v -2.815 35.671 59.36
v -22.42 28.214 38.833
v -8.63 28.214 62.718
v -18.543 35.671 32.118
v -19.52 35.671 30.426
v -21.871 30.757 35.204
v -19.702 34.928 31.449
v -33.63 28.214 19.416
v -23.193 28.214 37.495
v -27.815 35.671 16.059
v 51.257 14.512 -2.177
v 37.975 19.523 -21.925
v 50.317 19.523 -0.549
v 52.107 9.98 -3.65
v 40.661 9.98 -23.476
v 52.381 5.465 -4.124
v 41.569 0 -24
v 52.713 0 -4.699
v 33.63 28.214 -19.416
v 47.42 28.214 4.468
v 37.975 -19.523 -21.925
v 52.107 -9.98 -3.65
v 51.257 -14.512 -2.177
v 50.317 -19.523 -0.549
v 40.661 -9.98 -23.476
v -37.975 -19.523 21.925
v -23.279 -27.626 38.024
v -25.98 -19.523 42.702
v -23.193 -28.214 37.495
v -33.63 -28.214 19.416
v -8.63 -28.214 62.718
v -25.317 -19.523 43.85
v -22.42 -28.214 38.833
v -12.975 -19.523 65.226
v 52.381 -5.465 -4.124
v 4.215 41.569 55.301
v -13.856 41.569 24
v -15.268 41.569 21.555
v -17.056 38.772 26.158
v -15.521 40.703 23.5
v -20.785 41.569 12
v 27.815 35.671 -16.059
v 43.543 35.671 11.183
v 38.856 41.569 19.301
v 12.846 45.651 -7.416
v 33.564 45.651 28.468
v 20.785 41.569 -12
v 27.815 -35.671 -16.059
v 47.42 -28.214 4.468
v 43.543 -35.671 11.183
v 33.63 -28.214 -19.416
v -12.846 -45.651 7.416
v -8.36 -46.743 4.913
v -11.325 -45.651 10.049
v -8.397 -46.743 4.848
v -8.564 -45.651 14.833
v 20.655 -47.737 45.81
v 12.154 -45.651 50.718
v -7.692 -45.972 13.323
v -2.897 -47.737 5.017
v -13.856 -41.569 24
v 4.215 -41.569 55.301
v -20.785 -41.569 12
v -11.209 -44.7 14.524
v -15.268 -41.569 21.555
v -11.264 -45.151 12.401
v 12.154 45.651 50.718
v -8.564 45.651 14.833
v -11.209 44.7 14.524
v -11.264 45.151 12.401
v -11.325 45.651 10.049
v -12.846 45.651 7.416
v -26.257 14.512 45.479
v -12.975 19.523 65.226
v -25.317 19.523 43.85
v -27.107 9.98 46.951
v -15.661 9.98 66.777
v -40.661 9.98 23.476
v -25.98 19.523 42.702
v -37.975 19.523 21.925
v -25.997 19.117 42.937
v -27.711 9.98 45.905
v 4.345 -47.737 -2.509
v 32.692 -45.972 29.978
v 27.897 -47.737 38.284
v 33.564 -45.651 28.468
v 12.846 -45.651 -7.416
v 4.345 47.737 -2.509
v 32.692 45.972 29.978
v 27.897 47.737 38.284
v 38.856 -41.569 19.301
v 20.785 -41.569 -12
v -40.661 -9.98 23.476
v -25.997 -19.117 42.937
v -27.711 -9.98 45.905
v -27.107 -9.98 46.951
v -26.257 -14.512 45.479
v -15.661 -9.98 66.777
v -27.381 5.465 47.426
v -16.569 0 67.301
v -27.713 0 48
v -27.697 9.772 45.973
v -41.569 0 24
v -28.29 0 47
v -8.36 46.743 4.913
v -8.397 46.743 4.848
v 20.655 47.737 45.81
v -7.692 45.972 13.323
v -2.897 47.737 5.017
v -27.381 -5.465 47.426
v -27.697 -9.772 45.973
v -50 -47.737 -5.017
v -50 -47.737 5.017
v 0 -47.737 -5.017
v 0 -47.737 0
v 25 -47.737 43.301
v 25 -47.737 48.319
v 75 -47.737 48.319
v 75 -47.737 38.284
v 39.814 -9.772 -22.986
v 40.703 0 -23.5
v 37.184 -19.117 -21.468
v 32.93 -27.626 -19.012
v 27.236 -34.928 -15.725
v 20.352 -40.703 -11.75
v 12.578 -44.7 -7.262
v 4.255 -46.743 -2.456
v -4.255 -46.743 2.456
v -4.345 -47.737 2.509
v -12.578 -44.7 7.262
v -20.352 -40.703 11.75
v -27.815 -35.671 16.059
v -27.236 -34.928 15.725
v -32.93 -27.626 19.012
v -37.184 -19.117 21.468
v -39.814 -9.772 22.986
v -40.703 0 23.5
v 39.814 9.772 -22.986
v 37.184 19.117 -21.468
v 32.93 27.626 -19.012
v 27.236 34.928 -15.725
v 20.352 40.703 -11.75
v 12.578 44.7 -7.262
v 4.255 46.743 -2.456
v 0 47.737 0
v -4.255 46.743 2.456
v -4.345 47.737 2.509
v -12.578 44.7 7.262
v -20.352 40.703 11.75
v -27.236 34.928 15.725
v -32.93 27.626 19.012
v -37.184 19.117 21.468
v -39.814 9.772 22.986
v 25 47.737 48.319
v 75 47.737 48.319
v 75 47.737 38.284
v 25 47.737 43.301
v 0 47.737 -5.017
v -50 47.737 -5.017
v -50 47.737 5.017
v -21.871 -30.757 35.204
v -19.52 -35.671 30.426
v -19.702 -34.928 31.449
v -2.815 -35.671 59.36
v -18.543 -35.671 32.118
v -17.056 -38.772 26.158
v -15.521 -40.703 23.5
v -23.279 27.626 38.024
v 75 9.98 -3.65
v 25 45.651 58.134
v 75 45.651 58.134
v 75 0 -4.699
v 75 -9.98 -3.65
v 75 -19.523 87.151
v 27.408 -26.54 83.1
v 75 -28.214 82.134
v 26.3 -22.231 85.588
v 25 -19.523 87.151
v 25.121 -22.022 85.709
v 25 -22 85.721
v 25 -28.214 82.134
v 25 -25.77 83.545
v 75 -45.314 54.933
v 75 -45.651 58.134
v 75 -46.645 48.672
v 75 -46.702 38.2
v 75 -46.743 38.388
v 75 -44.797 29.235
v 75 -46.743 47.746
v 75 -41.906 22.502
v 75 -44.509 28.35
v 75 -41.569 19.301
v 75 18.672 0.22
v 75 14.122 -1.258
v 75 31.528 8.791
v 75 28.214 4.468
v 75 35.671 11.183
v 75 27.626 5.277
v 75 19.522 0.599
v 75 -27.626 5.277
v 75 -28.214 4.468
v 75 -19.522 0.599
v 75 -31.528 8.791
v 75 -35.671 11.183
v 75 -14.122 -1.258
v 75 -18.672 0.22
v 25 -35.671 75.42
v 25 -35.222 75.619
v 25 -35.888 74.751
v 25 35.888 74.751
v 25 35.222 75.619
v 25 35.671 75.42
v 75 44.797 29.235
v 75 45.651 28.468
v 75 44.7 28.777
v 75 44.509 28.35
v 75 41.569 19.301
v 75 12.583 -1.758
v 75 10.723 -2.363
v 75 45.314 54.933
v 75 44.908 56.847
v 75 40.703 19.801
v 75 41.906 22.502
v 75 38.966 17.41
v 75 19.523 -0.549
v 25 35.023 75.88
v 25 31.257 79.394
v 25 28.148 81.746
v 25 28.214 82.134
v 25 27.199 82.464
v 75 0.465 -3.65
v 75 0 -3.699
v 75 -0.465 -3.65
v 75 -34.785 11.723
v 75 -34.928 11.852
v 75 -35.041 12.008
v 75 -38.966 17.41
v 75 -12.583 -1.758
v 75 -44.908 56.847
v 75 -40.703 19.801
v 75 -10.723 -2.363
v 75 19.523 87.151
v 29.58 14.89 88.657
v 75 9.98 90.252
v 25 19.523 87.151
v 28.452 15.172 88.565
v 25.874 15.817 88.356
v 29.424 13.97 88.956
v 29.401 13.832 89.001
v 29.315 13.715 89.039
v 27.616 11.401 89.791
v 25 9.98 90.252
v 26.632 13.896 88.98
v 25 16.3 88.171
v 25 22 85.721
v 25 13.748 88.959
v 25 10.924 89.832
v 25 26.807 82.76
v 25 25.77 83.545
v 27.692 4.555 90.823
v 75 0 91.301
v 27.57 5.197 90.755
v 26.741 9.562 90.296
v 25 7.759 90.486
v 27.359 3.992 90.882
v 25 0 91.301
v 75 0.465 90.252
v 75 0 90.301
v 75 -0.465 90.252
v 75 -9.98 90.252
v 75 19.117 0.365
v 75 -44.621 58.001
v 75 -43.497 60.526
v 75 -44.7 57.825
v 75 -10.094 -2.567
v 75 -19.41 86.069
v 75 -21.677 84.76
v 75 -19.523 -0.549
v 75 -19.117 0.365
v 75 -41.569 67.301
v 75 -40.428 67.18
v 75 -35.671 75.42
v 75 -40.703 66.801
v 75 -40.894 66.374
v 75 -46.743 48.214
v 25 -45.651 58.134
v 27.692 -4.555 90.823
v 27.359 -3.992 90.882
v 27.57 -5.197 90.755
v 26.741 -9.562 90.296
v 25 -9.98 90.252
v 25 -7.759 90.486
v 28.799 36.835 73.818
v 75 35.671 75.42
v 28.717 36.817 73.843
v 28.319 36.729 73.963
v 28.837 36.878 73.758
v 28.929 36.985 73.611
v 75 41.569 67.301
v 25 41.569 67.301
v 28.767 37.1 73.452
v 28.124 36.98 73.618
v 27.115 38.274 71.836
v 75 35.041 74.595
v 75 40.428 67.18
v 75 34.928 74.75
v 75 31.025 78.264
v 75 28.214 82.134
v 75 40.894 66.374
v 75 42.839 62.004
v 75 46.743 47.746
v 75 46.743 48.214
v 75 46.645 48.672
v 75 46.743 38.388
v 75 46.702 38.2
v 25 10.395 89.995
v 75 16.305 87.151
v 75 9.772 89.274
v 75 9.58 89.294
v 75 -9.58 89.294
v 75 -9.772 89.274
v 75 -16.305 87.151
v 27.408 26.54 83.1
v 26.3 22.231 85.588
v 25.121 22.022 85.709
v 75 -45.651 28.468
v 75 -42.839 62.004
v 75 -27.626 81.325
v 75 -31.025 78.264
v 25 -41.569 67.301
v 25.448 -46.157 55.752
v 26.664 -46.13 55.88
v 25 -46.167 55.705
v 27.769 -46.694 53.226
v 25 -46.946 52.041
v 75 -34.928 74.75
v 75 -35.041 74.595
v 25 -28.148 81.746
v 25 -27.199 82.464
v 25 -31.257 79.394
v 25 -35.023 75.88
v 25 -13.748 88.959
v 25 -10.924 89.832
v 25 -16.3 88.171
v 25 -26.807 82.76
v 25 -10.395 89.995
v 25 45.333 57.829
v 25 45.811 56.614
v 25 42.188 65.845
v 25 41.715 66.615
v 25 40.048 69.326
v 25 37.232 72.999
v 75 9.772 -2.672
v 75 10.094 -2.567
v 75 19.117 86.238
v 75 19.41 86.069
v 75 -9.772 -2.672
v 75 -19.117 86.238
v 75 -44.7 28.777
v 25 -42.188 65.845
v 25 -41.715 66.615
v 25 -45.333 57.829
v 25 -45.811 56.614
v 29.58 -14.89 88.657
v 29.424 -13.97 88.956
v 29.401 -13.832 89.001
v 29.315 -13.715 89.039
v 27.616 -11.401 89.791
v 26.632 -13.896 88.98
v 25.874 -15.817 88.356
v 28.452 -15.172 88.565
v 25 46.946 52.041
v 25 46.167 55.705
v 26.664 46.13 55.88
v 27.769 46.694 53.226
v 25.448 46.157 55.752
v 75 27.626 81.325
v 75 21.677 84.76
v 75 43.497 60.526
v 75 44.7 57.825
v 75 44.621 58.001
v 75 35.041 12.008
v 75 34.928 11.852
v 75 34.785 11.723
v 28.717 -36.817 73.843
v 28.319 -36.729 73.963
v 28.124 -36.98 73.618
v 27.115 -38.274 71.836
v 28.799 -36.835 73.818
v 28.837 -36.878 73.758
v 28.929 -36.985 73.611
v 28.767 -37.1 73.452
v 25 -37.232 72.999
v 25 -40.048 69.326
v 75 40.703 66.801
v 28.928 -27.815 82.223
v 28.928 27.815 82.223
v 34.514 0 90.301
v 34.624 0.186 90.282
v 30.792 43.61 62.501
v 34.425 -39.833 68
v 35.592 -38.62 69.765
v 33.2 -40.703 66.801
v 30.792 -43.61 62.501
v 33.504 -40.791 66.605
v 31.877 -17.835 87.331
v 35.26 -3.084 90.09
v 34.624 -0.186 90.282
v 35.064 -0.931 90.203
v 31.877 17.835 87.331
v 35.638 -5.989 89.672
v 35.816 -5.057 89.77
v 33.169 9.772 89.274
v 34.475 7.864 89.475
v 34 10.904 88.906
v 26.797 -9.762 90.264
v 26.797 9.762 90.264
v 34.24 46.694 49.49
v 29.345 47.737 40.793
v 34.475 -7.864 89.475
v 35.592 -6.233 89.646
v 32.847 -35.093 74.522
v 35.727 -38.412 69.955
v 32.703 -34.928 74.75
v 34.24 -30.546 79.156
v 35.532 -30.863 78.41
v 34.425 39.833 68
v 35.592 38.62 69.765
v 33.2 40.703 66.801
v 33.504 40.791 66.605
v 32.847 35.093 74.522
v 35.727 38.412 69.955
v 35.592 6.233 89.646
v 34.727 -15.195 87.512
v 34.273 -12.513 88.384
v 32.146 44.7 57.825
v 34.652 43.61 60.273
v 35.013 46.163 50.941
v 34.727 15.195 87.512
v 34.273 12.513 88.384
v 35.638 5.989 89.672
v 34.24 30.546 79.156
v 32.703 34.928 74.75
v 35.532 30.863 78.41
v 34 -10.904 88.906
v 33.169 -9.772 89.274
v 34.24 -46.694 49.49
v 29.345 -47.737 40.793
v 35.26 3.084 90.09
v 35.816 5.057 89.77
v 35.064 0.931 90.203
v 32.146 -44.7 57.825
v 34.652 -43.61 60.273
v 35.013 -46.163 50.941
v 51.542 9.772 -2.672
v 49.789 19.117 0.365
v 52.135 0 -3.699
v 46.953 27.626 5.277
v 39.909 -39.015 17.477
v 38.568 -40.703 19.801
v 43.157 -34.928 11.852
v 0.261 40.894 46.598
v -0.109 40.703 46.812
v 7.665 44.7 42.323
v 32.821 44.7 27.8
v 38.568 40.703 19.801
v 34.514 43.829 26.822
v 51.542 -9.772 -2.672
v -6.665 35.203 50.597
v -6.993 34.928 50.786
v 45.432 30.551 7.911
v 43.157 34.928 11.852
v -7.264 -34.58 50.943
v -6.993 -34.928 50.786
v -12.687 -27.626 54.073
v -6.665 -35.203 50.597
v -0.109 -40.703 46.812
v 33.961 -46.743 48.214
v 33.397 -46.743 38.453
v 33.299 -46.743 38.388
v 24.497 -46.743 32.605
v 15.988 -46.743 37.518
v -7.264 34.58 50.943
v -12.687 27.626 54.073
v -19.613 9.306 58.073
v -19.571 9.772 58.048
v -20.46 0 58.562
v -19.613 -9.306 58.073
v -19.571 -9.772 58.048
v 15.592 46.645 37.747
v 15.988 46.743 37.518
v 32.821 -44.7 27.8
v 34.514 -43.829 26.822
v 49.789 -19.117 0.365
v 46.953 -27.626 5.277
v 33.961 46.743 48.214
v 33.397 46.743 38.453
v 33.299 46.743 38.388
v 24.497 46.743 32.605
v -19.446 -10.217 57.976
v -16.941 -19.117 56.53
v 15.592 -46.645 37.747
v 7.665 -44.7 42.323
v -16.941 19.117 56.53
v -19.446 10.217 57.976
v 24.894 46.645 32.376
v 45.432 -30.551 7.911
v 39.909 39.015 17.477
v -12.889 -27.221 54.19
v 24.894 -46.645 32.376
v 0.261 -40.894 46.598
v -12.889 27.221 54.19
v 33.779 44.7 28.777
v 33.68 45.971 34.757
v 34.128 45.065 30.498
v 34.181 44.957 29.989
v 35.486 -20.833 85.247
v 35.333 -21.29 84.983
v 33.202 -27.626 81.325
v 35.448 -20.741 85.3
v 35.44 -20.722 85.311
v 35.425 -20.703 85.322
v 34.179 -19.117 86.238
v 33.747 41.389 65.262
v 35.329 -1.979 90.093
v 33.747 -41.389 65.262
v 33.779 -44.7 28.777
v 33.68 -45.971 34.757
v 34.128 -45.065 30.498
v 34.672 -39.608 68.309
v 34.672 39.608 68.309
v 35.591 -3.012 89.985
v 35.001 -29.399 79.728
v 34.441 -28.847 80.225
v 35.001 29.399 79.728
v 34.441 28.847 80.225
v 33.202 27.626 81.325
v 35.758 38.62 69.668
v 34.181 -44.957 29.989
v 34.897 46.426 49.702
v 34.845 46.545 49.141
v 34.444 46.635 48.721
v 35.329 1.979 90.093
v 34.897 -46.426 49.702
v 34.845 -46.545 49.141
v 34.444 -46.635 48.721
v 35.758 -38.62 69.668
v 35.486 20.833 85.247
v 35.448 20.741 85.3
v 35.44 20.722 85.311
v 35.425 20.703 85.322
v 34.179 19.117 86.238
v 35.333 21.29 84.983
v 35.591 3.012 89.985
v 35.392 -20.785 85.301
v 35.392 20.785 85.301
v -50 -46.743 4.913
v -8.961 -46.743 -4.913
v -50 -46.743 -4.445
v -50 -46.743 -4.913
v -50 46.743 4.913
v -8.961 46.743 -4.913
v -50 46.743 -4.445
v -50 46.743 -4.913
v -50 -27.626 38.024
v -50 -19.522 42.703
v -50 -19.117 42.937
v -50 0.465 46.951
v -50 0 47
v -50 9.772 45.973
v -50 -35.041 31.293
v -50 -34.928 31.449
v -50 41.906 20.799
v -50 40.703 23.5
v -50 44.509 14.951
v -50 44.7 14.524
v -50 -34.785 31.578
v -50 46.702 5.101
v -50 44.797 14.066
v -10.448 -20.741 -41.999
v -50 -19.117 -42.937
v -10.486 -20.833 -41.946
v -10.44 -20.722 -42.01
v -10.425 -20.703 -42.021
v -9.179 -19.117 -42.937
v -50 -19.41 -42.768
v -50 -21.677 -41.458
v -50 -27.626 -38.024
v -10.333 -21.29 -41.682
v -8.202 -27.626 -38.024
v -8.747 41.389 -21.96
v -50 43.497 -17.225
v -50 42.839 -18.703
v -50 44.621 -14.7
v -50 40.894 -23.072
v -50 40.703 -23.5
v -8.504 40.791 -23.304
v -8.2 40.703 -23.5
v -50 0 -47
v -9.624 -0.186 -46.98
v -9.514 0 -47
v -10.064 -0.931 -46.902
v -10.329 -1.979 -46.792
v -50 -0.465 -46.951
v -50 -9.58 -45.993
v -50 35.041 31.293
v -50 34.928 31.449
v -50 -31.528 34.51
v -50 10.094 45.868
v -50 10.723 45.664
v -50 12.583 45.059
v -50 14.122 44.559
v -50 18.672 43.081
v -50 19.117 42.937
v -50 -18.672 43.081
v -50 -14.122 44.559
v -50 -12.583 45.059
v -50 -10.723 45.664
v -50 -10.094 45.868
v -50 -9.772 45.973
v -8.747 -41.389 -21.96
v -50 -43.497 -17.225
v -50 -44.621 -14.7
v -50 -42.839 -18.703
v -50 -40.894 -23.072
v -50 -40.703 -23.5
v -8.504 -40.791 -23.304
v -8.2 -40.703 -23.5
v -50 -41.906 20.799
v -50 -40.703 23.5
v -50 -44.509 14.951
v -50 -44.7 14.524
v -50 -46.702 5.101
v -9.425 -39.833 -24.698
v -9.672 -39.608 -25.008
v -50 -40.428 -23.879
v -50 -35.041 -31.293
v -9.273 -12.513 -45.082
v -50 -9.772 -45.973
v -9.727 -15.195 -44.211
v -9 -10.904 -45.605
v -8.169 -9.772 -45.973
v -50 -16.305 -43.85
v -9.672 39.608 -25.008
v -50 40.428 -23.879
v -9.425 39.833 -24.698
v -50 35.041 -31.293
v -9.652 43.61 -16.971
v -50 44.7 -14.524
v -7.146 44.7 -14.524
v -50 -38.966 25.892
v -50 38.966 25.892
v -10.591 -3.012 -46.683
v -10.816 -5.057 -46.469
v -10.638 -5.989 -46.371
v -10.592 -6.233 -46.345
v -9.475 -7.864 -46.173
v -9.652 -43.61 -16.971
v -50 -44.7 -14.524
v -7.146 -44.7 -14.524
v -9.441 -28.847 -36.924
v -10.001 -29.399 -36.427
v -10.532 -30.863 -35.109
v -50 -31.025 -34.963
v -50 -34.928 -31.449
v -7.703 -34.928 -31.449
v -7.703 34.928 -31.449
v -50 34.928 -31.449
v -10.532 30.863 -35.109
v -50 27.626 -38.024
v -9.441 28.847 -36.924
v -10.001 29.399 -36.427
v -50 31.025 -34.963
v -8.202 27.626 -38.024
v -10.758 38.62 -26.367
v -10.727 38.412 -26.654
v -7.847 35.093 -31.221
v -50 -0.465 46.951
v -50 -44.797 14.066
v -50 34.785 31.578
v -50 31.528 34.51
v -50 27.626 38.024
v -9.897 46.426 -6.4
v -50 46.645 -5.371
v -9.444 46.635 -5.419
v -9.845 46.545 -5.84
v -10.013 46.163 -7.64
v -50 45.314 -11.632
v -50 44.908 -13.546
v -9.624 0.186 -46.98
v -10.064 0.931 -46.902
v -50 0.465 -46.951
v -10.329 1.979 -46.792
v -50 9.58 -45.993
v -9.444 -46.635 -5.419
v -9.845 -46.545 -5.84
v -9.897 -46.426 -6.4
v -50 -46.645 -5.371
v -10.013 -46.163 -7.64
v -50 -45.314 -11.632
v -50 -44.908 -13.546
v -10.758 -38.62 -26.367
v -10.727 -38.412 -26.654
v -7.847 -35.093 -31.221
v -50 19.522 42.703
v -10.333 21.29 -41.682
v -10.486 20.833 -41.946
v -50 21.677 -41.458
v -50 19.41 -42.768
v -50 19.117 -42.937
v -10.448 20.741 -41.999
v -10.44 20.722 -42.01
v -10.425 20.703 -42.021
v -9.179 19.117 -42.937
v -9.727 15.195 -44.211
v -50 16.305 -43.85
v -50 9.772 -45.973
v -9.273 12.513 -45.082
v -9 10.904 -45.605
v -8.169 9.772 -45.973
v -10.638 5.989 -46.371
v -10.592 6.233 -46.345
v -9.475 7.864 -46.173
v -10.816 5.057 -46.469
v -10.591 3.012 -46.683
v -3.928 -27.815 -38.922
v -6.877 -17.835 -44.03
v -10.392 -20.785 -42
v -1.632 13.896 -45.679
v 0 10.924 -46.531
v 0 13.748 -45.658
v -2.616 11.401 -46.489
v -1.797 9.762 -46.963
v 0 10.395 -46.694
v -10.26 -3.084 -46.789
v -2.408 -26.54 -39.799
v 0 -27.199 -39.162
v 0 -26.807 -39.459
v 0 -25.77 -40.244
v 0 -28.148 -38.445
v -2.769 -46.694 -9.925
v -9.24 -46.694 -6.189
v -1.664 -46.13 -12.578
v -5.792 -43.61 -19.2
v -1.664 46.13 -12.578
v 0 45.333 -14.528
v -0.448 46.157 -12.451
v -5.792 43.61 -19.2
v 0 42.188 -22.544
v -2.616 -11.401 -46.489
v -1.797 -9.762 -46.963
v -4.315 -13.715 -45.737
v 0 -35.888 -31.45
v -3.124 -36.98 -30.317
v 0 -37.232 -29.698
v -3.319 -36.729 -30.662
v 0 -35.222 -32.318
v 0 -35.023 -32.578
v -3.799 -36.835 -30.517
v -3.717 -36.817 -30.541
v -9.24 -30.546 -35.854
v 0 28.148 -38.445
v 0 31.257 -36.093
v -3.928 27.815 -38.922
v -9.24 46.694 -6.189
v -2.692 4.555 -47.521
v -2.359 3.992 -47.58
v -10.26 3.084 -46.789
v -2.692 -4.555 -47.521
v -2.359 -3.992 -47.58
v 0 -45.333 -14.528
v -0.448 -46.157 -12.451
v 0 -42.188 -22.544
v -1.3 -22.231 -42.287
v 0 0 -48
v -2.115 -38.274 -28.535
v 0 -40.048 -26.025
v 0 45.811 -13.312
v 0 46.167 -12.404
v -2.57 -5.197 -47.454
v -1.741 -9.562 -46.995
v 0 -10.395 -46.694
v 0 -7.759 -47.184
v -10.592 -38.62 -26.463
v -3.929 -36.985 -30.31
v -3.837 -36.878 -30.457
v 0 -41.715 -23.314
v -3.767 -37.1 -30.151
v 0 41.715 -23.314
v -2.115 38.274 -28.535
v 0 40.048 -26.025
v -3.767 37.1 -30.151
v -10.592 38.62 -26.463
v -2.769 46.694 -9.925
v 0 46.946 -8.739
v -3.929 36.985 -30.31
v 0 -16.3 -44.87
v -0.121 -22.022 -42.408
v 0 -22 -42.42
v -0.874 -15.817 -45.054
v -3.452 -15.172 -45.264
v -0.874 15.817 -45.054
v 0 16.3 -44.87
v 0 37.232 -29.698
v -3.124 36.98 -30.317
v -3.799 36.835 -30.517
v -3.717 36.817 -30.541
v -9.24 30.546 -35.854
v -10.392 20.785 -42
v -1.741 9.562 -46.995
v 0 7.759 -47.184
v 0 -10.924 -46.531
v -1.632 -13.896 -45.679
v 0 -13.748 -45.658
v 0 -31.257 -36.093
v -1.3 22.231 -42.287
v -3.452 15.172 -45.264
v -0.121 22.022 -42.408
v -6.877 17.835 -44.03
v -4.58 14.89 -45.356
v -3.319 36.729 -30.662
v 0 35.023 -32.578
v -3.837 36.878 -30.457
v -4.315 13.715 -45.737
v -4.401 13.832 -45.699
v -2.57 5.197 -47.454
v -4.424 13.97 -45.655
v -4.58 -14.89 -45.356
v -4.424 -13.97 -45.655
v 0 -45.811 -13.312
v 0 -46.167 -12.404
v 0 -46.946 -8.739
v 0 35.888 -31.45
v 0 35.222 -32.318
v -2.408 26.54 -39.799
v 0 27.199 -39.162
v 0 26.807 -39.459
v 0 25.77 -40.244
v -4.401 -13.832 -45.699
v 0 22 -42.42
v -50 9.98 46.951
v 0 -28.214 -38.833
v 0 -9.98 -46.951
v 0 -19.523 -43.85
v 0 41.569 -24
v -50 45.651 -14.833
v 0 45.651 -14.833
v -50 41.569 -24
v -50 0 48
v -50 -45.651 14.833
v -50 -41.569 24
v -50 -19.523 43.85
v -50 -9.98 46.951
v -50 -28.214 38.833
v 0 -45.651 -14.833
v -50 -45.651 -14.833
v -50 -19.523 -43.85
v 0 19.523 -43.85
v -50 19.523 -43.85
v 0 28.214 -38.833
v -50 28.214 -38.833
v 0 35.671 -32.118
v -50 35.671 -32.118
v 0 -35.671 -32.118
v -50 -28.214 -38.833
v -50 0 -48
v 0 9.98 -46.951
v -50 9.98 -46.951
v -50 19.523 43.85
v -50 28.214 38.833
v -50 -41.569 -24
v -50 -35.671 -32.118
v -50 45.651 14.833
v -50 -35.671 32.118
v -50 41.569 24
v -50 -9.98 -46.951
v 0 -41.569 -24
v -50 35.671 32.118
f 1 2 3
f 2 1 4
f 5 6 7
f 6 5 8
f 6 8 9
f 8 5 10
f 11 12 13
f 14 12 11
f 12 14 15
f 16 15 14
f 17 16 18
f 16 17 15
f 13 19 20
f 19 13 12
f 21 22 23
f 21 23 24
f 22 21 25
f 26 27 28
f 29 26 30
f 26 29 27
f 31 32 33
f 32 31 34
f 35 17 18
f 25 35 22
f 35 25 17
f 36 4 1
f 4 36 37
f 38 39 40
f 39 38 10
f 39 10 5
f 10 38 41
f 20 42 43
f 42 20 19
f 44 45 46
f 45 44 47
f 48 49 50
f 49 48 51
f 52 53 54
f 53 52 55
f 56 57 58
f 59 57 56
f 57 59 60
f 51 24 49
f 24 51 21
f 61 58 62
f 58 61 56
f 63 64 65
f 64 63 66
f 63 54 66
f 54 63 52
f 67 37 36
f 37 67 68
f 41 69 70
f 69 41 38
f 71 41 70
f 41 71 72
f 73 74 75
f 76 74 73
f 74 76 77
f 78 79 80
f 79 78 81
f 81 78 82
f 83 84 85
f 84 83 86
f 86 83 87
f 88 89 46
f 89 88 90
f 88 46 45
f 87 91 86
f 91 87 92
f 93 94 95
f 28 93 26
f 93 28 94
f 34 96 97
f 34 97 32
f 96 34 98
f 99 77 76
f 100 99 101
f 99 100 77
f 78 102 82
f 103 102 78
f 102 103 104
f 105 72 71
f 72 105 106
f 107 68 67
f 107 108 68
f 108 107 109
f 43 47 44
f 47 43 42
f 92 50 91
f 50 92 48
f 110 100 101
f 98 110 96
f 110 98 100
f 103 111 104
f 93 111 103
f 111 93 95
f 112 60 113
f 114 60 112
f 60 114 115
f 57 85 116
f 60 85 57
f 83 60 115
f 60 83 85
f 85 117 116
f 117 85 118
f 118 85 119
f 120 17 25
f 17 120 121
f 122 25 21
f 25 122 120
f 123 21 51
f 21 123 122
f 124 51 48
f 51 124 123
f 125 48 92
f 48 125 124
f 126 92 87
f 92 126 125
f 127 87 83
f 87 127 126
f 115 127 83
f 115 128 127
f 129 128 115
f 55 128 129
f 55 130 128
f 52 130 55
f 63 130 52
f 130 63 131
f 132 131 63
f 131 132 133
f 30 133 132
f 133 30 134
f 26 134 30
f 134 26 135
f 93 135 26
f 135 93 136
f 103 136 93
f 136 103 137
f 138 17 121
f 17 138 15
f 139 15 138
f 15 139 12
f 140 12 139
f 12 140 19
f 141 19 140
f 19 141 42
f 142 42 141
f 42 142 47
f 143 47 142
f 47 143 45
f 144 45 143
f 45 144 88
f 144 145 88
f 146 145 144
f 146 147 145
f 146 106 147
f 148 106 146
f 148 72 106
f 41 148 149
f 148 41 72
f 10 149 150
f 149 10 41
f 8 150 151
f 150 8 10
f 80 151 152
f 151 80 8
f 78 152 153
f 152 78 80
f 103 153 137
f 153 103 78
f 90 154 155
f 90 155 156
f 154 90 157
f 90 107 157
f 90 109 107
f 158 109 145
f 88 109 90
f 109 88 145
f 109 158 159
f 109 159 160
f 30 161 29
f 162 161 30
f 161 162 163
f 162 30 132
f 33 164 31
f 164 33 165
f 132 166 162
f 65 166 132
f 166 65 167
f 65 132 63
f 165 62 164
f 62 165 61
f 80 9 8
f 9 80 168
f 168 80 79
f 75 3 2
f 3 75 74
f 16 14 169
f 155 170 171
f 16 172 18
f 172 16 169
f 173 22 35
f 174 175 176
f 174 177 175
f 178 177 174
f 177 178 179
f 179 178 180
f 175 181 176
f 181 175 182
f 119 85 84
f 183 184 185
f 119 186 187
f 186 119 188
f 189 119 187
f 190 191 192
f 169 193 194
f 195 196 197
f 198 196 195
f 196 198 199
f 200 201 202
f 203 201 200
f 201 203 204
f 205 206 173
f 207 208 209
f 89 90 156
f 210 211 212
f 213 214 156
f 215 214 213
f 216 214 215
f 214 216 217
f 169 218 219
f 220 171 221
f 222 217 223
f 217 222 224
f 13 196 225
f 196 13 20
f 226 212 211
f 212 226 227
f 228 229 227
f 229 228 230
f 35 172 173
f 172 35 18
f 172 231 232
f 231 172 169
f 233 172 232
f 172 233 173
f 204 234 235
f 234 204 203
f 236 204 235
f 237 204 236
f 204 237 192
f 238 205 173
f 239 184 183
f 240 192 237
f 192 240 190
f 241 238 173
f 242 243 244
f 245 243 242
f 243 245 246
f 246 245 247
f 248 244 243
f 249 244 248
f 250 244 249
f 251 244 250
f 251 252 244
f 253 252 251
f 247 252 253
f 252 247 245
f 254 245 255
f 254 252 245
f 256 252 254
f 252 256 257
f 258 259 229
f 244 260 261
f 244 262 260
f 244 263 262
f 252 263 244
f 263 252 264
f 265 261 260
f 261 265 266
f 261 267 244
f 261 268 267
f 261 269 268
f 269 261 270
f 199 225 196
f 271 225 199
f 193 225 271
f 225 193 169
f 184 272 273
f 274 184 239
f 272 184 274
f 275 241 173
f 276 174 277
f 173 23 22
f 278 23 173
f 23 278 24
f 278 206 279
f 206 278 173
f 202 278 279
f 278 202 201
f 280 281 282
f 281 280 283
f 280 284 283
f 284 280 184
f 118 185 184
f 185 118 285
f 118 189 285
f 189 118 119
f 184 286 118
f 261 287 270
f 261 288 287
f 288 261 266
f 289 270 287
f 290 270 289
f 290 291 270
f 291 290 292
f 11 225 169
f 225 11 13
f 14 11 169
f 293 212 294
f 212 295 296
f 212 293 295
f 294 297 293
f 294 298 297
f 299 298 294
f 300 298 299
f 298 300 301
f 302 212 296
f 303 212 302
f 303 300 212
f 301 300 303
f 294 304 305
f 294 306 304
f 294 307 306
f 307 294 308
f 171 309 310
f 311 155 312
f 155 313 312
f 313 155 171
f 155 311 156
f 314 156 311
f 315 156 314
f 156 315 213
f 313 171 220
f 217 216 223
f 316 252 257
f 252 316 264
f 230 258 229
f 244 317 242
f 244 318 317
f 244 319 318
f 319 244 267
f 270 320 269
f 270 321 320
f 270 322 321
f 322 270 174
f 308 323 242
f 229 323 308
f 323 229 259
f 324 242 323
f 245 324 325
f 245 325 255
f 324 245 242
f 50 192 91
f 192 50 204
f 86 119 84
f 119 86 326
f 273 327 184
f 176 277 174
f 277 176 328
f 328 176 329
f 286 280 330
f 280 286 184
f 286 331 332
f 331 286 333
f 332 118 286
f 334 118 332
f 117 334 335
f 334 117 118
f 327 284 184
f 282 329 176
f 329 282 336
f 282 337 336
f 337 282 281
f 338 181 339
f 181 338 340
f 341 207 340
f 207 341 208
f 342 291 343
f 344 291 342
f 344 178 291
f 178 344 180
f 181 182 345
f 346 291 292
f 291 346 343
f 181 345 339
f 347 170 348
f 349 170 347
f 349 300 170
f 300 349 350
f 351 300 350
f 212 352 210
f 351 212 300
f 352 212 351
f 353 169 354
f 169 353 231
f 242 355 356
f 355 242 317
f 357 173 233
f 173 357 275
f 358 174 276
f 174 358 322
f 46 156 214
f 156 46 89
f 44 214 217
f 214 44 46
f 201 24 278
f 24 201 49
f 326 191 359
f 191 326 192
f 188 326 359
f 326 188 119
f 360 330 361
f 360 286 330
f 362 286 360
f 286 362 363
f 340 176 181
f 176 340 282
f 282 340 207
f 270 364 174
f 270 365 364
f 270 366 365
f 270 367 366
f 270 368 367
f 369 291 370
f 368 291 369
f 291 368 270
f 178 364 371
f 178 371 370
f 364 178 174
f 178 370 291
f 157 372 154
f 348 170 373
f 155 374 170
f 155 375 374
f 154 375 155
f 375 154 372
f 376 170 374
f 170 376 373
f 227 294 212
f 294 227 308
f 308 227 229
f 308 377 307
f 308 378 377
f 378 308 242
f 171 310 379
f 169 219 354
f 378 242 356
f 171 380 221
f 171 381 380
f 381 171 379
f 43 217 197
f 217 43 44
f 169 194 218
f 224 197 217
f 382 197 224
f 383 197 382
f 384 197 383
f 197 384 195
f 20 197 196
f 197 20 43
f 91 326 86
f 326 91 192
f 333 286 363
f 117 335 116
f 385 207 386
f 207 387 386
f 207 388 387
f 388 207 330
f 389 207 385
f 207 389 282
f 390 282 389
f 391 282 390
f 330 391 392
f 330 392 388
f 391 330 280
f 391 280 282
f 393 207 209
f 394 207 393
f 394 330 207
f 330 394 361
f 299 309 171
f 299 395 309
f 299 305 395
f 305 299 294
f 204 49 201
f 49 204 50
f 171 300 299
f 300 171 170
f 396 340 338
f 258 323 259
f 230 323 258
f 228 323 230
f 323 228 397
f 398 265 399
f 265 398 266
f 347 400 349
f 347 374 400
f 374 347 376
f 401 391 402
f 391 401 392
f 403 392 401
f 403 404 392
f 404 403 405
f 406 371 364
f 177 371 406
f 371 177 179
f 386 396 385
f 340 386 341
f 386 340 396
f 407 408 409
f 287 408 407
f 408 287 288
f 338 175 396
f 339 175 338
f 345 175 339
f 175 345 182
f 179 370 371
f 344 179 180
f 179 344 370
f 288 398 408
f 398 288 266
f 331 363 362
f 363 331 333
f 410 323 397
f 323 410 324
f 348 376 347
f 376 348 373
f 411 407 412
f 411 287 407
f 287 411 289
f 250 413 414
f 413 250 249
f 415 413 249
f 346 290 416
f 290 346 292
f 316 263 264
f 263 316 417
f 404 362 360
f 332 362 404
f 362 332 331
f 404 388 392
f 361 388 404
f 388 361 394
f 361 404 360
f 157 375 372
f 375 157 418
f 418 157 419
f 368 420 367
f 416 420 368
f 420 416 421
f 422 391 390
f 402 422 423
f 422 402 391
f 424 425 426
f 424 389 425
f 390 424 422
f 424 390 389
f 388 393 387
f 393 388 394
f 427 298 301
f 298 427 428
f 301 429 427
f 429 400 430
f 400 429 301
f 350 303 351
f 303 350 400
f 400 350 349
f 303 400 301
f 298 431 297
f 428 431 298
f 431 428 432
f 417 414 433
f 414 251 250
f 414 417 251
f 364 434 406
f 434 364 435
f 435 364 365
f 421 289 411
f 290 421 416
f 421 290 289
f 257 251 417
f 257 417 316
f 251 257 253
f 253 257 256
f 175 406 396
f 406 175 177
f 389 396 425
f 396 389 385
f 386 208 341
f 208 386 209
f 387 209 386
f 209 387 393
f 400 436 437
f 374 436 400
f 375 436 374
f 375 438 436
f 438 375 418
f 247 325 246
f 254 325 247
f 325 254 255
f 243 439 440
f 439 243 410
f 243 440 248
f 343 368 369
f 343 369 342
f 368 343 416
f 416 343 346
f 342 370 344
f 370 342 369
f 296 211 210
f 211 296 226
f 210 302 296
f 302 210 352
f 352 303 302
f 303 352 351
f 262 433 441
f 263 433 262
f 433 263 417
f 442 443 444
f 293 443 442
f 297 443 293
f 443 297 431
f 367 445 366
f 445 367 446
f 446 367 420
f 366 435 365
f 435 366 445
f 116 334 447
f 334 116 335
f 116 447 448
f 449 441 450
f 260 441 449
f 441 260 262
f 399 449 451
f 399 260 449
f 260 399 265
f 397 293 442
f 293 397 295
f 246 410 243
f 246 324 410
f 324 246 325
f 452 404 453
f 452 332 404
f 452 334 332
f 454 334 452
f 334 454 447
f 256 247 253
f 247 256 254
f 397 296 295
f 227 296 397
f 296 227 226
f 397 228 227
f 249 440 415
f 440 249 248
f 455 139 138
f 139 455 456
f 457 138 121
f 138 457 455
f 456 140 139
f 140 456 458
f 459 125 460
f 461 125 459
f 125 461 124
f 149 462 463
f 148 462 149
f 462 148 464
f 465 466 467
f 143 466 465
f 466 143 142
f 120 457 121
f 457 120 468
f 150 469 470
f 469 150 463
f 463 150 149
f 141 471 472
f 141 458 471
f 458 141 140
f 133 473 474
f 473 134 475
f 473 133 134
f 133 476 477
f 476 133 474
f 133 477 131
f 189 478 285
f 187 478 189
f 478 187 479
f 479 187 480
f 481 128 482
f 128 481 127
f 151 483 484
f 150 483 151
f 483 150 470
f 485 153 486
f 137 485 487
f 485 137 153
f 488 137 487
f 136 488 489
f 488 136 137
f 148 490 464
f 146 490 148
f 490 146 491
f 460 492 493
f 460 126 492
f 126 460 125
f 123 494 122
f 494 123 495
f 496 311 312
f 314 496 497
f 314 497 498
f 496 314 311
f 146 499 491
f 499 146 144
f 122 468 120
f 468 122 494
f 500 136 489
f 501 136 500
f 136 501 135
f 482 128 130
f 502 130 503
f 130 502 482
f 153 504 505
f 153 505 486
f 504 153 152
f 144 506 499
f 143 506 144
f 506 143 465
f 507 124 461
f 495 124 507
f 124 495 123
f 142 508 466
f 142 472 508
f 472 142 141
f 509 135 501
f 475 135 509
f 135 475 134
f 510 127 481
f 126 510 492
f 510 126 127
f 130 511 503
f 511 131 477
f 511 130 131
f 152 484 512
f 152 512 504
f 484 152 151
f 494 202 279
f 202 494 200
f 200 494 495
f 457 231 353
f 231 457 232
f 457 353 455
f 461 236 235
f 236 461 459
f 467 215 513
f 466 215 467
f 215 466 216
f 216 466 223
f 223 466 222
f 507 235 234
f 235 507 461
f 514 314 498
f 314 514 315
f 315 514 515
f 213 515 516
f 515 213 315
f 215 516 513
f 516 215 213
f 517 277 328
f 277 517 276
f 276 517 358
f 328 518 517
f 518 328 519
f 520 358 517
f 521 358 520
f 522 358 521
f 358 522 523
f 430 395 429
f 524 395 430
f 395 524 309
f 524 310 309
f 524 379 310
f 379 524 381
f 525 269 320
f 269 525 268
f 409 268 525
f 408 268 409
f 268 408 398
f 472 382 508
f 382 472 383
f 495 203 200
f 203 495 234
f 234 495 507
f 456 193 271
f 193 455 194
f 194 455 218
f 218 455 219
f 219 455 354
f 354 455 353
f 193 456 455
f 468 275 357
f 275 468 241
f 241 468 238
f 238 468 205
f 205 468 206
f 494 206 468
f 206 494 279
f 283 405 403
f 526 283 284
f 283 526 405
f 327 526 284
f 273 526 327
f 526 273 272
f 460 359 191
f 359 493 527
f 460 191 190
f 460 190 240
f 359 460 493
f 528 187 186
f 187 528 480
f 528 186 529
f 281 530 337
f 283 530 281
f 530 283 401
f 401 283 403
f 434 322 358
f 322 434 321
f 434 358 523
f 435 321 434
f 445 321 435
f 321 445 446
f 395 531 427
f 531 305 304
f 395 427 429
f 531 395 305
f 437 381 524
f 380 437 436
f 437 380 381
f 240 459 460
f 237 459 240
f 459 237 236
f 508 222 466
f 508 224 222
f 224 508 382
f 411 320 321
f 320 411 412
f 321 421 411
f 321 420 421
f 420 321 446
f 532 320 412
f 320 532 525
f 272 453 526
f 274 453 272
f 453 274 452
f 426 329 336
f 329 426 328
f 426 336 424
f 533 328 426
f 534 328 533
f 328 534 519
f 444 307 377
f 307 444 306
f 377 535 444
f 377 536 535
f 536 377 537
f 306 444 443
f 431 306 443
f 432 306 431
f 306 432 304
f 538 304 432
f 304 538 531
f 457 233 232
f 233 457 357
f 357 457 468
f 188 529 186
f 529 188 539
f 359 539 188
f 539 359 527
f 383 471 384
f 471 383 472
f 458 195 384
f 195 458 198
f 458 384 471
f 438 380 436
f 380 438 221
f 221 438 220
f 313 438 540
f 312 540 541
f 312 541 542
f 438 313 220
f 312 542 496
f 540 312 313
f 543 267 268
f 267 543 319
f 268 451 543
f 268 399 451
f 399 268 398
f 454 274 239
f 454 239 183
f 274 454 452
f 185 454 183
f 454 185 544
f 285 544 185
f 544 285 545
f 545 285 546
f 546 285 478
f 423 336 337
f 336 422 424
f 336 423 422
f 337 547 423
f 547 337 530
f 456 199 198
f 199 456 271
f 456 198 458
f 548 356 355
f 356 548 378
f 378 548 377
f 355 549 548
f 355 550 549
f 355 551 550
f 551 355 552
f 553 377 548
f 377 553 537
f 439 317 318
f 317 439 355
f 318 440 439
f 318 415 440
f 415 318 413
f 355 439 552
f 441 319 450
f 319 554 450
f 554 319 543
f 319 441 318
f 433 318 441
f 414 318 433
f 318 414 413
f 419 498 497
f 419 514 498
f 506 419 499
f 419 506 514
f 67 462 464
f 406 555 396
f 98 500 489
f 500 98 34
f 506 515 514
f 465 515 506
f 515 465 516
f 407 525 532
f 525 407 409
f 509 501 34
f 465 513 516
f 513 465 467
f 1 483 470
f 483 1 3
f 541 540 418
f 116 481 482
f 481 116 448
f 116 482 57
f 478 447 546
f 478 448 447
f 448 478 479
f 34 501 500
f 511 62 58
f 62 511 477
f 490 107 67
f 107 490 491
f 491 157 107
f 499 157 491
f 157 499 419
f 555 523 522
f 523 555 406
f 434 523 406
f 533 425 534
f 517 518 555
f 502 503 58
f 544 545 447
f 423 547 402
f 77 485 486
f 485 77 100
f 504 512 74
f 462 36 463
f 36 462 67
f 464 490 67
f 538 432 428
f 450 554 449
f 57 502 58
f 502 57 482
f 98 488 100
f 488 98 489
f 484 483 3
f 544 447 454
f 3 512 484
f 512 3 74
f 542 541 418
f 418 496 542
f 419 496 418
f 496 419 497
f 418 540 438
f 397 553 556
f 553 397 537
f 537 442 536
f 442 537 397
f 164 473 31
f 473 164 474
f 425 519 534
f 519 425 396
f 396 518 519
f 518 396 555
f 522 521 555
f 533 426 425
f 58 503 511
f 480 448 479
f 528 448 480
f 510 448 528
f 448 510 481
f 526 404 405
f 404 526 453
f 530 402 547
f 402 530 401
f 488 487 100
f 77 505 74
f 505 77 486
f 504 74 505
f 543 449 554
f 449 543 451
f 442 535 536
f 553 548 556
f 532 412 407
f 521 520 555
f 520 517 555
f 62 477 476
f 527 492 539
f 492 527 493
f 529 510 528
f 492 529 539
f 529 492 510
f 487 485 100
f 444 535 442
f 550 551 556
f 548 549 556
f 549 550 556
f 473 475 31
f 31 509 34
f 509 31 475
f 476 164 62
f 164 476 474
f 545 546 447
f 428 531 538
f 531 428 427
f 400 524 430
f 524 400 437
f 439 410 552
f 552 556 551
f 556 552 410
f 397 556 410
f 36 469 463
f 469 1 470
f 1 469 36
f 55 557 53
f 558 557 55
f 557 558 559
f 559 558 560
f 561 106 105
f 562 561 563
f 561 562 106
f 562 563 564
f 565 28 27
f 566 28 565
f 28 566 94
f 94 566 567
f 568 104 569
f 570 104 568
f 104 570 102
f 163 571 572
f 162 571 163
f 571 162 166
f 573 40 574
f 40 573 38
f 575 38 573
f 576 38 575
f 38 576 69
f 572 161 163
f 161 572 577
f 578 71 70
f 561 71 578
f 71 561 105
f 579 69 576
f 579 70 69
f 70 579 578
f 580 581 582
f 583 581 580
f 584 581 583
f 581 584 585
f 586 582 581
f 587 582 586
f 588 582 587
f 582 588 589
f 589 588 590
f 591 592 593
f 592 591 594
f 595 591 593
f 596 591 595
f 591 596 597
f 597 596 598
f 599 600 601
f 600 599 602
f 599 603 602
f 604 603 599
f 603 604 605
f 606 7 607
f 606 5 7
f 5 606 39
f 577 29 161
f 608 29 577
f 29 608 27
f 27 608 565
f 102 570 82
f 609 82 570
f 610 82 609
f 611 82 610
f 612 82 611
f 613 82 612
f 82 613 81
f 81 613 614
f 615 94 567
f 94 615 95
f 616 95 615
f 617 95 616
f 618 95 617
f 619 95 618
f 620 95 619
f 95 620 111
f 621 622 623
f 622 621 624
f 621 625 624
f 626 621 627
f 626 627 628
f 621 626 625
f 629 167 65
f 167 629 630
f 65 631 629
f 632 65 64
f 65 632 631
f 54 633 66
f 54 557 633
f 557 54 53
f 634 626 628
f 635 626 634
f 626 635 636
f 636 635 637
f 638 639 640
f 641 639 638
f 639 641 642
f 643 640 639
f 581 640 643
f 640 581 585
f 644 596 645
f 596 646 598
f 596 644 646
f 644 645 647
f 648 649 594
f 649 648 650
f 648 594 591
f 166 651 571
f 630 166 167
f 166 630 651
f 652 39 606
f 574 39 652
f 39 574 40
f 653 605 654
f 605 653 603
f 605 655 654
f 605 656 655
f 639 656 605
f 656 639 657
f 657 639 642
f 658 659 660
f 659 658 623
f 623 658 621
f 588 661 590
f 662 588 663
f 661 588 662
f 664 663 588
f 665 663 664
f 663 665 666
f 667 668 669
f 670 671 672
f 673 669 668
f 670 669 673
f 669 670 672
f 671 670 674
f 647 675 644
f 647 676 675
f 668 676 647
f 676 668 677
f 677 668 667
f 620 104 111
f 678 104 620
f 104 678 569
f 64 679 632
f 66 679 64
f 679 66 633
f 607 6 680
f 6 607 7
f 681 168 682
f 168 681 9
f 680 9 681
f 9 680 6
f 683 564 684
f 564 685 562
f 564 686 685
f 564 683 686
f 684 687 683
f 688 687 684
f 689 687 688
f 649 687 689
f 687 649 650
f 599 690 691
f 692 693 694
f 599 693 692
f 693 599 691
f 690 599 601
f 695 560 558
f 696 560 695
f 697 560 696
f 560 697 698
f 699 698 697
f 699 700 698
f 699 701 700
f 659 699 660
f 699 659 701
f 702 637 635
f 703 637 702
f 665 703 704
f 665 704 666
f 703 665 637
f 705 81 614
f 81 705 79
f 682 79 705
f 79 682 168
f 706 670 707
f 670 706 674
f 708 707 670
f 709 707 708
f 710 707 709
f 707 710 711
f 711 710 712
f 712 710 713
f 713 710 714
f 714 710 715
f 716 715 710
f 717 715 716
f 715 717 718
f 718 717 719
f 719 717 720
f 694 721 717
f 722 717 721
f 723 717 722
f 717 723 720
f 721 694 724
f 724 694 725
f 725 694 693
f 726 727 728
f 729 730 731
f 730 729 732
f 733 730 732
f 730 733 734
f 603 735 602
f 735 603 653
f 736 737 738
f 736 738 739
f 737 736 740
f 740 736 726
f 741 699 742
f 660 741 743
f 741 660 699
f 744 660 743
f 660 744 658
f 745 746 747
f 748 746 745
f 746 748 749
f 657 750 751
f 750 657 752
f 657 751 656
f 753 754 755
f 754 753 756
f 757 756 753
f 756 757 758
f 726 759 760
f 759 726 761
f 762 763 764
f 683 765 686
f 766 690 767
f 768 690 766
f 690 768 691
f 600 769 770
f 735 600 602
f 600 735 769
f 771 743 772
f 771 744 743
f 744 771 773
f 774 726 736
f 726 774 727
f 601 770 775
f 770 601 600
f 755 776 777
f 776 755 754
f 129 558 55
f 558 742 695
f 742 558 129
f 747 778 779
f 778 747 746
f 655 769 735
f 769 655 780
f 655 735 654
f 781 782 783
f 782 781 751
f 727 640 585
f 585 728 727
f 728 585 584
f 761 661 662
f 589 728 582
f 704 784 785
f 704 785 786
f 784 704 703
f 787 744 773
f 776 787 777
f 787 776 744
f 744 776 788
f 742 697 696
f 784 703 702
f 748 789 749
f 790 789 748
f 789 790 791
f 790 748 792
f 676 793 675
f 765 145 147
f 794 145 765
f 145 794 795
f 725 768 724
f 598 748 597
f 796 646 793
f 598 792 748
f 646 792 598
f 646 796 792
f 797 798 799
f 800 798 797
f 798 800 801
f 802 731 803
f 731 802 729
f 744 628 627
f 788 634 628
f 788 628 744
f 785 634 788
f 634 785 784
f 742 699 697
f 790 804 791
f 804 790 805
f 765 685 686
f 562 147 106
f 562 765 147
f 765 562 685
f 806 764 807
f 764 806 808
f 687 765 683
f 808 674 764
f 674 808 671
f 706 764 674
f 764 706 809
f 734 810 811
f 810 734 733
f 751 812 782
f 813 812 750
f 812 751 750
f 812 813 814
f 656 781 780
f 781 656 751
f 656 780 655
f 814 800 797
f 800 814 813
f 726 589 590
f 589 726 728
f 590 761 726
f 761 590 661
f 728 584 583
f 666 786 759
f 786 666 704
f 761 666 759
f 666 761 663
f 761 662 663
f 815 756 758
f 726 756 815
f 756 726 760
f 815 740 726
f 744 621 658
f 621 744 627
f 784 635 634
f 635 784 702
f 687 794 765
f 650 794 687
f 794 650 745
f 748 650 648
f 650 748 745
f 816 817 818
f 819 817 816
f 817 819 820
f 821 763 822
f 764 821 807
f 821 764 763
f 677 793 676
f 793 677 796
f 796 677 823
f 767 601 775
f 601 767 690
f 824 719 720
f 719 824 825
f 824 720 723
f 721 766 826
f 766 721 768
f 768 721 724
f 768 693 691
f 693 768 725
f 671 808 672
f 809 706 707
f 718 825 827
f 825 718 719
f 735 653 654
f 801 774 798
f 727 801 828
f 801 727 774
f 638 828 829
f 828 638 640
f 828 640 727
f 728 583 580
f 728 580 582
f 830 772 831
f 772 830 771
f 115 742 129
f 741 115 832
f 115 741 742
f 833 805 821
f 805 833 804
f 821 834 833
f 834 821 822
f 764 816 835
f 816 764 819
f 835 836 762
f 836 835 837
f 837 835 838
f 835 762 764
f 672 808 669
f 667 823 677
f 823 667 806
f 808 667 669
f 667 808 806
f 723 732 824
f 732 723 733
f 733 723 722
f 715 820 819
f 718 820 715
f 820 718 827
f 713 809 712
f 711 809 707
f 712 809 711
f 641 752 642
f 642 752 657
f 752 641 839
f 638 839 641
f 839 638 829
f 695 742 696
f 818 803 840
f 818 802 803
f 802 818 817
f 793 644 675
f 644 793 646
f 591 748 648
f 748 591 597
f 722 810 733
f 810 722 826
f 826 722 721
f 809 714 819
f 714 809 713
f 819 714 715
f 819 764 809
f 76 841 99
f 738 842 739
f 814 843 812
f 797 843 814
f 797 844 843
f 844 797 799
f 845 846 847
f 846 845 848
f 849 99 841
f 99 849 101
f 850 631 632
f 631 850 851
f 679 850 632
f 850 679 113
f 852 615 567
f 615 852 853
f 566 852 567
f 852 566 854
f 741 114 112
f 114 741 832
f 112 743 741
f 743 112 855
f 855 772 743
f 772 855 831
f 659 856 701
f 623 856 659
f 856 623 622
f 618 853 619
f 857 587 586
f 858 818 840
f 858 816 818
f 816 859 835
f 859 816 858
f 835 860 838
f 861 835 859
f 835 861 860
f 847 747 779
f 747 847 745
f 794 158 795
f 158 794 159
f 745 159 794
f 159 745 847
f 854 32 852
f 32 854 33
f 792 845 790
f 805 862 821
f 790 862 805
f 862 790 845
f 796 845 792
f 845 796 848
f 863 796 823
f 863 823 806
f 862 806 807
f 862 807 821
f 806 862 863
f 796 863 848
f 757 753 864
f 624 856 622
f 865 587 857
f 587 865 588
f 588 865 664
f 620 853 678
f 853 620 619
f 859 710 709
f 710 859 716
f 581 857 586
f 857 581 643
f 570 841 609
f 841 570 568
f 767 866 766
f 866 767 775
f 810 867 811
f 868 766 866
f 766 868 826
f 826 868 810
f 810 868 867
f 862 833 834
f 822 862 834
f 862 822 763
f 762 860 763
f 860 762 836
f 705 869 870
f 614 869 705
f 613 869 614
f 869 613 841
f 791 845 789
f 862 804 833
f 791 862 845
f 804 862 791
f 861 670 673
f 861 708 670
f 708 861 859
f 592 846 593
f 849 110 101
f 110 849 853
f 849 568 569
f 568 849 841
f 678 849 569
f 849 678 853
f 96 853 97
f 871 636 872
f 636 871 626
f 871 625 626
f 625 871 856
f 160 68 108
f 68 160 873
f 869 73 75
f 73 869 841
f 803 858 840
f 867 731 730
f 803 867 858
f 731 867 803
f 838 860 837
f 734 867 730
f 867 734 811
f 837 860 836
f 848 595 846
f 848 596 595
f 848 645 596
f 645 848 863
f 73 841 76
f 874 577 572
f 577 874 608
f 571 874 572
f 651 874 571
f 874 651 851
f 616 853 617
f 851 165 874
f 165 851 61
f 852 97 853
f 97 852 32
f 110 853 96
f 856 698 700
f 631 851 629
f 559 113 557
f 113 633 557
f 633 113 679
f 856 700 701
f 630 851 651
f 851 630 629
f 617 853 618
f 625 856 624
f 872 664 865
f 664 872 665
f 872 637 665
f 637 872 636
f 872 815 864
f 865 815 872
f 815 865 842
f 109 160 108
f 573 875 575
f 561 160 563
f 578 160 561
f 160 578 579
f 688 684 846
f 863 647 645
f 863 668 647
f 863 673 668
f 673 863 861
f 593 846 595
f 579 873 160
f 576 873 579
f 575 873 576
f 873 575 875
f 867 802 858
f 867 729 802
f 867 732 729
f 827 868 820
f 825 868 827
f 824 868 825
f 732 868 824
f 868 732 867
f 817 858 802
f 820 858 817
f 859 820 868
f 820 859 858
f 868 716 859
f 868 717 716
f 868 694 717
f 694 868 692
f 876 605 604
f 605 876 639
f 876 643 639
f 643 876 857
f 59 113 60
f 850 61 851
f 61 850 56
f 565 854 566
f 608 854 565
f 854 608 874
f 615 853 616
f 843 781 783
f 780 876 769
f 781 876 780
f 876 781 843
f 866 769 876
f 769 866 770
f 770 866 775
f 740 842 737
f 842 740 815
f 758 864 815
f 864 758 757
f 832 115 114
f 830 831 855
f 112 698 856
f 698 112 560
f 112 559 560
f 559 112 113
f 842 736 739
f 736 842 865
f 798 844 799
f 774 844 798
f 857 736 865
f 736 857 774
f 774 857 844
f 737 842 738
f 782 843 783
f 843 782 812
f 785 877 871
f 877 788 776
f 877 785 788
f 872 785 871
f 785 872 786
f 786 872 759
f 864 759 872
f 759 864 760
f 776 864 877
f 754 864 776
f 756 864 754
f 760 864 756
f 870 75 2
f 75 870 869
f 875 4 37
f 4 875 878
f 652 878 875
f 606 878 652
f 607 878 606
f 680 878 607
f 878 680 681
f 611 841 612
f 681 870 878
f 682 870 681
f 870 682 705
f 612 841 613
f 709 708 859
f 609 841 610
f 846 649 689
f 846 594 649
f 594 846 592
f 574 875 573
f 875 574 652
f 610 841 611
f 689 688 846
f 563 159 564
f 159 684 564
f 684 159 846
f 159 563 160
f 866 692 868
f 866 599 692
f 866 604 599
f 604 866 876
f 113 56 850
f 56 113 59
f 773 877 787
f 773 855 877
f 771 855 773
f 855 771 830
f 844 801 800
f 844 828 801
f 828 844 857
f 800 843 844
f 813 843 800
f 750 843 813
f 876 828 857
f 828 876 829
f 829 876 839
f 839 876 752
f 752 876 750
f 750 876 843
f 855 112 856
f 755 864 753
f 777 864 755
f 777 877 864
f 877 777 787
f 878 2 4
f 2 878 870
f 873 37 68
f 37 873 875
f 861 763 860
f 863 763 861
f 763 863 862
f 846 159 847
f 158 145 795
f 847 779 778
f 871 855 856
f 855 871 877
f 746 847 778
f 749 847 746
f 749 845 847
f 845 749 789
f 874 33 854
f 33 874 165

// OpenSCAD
module tubebend(length,odiameter,idiameter,angle)
{
difference()
{
union()
{
cylinder(length,odiameter/2,odiameter/2);
translate([0,0,length])rotate([0,angle,0])cylinder(length,odiameter/2,odiameter/2);
translate([0,0,length])rotate([0,0,0])sphere(odiameter/2);
}
union()
{
translate([0,0,-1])cylinder(length+1,idiameter/2,idiameter/2);
translate([0,0,length])rotate([0,angle,0])cylinder(length+1,idiameter/2,idiameter/2);
translate([0,0,length])rotate([0,0,0])sphere(odiameter/2);
}
}
}

module bendonly(length,odiameter,idiameter,angle)
{
difference()
{
union()
{
//cylinder(length,odiameter/2,odiameter/2);
translate([0,0,length])rotate([0,angle,0])cylinder(length,odiameter/2,odiameter/2);
translate([0,0,length])rotate([0,0,0])sphere(odiameter/2);
}
union()
{
translate([0,0,-1])cylinder(length+1,idiameter/2,idiameter/2);
translate([0,0,length])rotate([0,angle,0])cylinder(length+1,idiameter/2,idiameter/2);
translate([0,0,length])rotate([0,0,0])sphere(odiameter/2);
}
}
}



Length=50;
fanD=94;
thickness=1;
id=fanD;
od=fanD+2*thickness;
angle=60;
rotate([0,90-angle,0])
union()
{
tubebend(Length,od,id,angle);
translate([0,0,Length])rotate([0,180,0])bendonly(Length,od,id,angle);
}
